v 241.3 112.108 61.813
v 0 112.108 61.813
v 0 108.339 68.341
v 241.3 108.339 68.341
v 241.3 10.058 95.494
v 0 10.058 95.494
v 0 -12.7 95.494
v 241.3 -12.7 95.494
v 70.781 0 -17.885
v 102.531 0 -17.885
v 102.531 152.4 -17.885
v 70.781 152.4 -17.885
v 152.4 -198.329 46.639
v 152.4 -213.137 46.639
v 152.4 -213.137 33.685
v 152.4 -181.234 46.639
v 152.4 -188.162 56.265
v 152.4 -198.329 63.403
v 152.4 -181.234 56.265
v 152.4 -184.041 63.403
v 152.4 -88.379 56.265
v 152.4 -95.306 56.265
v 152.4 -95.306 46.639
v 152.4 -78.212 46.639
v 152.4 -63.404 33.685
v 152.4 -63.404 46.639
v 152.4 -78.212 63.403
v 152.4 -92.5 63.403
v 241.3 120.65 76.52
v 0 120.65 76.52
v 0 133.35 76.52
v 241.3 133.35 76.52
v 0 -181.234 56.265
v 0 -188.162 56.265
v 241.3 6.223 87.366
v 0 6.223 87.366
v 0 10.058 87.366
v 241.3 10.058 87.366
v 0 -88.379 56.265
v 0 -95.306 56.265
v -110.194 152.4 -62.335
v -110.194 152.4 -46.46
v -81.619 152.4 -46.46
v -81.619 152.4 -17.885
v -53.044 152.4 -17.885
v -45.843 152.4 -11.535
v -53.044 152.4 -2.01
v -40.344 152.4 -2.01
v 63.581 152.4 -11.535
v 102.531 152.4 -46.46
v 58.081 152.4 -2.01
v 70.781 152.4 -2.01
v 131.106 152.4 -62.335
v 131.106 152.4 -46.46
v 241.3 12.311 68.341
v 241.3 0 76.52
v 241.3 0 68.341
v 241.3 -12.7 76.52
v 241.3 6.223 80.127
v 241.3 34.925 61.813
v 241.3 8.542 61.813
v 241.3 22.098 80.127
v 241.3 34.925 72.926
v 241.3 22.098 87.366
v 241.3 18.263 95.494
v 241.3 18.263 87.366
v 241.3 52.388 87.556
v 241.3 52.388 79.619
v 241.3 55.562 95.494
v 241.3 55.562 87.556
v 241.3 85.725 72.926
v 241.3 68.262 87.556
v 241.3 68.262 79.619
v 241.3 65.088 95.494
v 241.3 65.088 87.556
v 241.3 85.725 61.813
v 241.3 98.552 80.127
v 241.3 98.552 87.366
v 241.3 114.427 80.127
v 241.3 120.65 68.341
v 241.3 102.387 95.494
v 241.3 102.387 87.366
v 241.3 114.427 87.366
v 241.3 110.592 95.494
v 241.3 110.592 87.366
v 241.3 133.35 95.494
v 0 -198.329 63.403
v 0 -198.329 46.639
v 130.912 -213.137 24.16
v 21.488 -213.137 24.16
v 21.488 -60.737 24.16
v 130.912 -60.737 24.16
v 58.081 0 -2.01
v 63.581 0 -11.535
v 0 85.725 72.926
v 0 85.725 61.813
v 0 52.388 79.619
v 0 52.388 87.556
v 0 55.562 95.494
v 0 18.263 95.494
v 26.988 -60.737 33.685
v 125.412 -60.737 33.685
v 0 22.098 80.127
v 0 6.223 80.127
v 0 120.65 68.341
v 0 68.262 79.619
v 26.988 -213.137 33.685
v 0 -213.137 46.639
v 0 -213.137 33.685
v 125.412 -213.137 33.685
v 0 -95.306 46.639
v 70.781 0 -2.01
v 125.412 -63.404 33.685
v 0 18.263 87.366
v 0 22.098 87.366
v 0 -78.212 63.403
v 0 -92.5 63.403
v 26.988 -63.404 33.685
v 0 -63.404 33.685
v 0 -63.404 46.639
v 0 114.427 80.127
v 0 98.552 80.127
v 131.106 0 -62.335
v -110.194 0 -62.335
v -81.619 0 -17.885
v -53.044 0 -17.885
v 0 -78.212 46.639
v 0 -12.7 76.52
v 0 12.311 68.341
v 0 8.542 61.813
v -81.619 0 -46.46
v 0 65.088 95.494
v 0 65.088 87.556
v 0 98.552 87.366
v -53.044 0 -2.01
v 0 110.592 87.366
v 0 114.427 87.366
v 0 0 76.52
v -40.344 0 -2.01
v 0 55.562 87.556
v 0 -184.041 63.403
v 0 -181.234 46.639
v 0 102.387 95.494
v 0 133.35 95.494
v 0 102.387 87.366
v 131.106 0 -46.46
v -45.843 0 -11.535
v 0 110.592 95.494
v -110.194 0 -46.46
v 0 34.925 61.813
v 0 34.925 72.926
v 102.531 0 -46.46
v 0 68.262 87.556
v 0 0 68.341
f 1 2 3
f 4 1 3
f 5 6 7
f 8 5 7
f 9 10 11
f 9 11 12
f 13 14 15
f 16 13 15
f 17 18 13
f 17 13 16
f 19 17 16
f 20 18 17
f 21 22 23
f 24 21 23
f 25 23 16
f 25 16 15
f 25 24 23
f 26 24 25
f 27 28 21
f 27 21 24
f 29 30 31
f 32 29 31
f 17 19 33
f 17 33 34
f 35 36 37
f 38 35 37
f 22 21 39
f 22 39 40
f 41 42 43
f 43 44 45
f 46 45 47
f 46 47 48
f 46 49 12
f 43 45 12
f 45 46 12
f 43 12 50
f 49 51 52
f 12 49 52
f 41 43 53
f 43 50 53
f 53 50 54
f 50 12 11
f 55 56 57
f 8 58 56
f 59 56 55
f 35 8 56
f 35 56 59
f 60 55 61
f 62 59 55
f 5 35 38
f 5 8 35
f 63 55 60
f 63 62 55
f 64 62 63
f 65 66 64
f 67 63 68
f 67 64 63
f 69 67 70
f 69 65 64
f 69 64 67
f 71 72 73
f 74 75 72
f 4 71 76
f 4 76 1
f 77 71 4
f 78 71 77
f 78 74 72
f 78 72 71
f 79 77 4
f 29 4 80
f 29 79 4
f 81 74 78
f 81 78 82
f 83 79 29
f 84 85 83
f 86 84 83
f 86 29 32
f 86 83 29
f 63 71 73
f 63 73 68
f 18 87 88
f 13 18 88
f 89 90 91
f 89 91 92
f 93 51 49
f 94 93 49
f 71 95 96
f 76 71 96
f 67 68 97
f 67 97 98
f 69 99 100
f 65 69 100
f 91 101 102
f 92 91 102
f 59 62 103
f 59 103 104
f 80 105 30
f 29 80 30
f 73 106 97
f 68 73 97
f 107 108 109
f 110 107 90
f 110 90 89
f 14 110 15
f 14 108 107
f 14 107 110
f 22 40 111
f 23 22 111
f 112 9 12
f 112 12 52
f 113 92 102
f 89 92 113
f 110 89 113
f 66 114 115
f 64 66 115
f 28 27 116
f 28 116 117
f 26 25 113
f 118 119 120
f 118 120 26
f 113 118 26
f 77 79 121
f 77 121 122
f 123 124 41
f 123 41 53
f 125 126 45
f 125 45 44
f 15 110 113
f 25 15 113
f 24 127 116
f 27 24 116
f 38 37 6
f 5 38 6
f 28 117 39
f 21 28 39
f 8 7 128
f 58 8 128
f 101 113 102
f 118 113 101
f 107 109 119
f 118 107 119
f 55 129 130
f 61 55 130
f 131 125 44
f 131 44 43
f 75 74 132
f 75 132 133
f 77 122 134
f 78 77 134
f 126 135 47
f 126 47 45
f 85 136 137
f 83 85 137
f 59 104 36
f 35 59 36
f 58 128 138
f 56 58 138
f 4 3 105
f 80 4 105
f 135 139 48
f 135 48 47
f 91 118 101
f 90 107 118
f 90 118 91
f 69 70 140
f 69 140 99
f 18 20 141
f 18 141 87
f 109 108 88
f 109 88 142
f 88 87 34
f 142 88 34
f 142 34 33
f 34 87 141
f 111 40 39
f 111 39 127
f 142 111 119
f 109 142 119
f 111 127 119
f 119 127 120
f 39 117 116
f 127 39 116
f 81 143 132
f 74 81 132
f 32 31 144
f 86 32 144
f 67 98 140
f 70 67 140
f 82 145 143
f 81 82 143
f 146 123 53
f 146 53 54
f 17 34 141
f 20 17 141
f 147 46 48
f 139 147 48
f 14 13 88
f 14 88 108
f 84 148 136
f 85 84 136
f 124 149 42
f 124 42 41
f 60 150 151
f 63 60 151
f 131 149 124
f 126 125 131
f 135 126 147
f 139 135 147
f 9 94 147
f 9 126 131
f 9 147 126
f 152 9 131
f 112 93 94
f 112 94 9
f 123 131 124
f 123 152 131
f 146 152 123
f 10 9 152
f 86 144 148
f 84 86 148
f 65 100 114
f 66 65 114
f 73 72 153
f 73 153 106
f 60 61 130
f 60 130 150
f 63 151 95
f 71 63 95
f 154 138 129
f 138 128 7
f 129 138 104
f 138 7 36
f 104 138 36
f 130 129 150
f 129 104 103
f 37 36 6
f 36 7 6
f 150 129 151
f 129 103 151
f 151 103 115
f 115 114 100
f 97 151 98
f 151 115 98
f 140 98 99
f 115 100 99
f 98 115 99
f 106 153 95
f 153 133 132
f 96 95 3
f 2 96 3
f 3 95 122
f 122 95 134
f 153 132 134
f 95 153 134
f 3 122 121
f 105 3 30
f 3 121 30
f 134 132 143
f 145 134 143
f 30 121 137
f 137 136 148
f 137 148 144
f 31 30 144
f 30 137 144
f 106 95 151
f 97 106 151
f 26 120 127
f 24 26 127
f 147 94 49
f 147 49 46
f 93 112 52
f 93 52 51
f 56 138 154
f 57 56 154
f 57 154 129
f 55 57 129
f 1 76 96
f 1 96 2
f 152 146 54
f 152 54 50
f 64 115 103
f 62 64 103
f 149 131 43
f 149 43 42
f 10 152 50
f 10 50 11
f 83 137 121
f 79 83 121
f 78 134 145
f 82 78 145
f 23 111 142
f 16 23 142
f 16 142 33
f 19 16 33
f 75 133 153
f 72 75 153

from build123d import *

# Parameters (mm, degrees)
F1_DEPTH = 152.4
F3_DEPTH = 241.3
F5_DEPTH = 152.4
F7_DEPTH = 152.4


with BuildPart() as f1:
    # F0 (on Front) → F1 (new body)
    with BuildSketch(Plane.XZ):
        Polygon((-110.1936613465, -46.4599046108), (-110.1936613465, -62.3349046108), (131.1063386535, -62.3349046108), (131.1063386535, -46.4599046108), (102.5313386535, -46.4599046108), (102.5313386535, -17.8849046108), (70.7813386535, -17.8849046108), (70.7813386535, -2.0099046108), (58.0813386535, -2.0099046108), (63.5805999675, -11.5349046108), (-45.8429226605, -11.5349046108), (-40.3436613465, -2.0099046108), (-53.0436613465, -2.0099046108), (-53.0436613465, -17.8849046108), (-81.6186613465, -17.8849046108), (-81.6186613465, -46.4599046108), align=None)
    extrude(amount=-F1_DEPTH)


with BuildPart() as f3:
    # F2 (on Right) → F3 (new body)
    with BuildSketch(Plane.YZ):
        Polygon((12.3105041872, 68.34122984), (8.5416771, 61.81342984), (34.925, 61.81342984), (34.925, 72.92592984), (85.725, 72.92592984), (85.725, 61.81342984), (112.1083229, 61.81342984), (108.3394958128, 68.34122984), (120.65, 68.34122984), (120.65, 76.52002984), (133.35, 76.52002984), (133.35, 95.49382984), (110.5916, 95.49382984), (110.5916, 87.36582984), (114.427, 87.36582984), (114.427, 80.12682984), (98.552, 80.12682984), (98.552, 87.36582984), (102.3874, 87.36582984), (102.3874, 95.49382984), (65.0875, 95.49382984), (65.0875, 87.55632984), (68.2625, 87.55632984), (68.2625, 79.61882984), (52.3875, 79.61882984), (52.3875, 87.55632984), (55.5625, 87.55632984), (55.5625, 95.49382984), (18.2626, 95.49382984), (18.2626, 87.36582984), (22.098, 87.36582984), (22.098, 80.12682984), (6.223, 80.12682984), (6.223, 87.36582984), (10.0584, 87.36582984), (10.0584, 95.49382984), (-12.7, 95.49382984), (-12.7, 76.52002984), (0, 76.52002984), (0, 68.34122984), align=None)
    extrude(amount=F3_DEPTH)


with BuildPart() as f5:
    # F4 (on Right) → F5 (new body)
    with BuildSketch(Plane.YZ):
        Polygon((-213.1368674653, 46.6388186438), (-213.1368674653, 33.6848186438), (-63.4038674653, 33.6848186438), (-63.4038674653, 46.6388186438), (-78.2120674653, 46.6388186438), (-78.2120674653, 63.4028186438), (-92.4995674653, 63.4028186438), (-88.378787654, 56.2654186438), (-95.3062674653, 56.2654186438), (-95.3062674653, 46.6388186438), (-181.2344674653, 46.6388186438), (-181.2344674653, 56.2654186438), (-188.1619472766, 56.2654186438), (-184.0411674653, 63.4028186438), (-198.3286674653, 63.4028186438), (-198.3286674653, 46.6388186438), align=None)
    extrude(amount=F5_DEPTH)

    # F6 (on face) → F7 (join)
    with BuildSketch(Plane.XZ.offset(213.1368674653)):
        Polygon((125.4125, 33.6848186438), (26.9875, 33.6848186438), (21.4884, 24.1600980479), (130.9116, 24.1600980479), align=None)
    extrude(amount=-F7_DEPTH)


solid = Compound([f1.part, f3.part, f5.part])
